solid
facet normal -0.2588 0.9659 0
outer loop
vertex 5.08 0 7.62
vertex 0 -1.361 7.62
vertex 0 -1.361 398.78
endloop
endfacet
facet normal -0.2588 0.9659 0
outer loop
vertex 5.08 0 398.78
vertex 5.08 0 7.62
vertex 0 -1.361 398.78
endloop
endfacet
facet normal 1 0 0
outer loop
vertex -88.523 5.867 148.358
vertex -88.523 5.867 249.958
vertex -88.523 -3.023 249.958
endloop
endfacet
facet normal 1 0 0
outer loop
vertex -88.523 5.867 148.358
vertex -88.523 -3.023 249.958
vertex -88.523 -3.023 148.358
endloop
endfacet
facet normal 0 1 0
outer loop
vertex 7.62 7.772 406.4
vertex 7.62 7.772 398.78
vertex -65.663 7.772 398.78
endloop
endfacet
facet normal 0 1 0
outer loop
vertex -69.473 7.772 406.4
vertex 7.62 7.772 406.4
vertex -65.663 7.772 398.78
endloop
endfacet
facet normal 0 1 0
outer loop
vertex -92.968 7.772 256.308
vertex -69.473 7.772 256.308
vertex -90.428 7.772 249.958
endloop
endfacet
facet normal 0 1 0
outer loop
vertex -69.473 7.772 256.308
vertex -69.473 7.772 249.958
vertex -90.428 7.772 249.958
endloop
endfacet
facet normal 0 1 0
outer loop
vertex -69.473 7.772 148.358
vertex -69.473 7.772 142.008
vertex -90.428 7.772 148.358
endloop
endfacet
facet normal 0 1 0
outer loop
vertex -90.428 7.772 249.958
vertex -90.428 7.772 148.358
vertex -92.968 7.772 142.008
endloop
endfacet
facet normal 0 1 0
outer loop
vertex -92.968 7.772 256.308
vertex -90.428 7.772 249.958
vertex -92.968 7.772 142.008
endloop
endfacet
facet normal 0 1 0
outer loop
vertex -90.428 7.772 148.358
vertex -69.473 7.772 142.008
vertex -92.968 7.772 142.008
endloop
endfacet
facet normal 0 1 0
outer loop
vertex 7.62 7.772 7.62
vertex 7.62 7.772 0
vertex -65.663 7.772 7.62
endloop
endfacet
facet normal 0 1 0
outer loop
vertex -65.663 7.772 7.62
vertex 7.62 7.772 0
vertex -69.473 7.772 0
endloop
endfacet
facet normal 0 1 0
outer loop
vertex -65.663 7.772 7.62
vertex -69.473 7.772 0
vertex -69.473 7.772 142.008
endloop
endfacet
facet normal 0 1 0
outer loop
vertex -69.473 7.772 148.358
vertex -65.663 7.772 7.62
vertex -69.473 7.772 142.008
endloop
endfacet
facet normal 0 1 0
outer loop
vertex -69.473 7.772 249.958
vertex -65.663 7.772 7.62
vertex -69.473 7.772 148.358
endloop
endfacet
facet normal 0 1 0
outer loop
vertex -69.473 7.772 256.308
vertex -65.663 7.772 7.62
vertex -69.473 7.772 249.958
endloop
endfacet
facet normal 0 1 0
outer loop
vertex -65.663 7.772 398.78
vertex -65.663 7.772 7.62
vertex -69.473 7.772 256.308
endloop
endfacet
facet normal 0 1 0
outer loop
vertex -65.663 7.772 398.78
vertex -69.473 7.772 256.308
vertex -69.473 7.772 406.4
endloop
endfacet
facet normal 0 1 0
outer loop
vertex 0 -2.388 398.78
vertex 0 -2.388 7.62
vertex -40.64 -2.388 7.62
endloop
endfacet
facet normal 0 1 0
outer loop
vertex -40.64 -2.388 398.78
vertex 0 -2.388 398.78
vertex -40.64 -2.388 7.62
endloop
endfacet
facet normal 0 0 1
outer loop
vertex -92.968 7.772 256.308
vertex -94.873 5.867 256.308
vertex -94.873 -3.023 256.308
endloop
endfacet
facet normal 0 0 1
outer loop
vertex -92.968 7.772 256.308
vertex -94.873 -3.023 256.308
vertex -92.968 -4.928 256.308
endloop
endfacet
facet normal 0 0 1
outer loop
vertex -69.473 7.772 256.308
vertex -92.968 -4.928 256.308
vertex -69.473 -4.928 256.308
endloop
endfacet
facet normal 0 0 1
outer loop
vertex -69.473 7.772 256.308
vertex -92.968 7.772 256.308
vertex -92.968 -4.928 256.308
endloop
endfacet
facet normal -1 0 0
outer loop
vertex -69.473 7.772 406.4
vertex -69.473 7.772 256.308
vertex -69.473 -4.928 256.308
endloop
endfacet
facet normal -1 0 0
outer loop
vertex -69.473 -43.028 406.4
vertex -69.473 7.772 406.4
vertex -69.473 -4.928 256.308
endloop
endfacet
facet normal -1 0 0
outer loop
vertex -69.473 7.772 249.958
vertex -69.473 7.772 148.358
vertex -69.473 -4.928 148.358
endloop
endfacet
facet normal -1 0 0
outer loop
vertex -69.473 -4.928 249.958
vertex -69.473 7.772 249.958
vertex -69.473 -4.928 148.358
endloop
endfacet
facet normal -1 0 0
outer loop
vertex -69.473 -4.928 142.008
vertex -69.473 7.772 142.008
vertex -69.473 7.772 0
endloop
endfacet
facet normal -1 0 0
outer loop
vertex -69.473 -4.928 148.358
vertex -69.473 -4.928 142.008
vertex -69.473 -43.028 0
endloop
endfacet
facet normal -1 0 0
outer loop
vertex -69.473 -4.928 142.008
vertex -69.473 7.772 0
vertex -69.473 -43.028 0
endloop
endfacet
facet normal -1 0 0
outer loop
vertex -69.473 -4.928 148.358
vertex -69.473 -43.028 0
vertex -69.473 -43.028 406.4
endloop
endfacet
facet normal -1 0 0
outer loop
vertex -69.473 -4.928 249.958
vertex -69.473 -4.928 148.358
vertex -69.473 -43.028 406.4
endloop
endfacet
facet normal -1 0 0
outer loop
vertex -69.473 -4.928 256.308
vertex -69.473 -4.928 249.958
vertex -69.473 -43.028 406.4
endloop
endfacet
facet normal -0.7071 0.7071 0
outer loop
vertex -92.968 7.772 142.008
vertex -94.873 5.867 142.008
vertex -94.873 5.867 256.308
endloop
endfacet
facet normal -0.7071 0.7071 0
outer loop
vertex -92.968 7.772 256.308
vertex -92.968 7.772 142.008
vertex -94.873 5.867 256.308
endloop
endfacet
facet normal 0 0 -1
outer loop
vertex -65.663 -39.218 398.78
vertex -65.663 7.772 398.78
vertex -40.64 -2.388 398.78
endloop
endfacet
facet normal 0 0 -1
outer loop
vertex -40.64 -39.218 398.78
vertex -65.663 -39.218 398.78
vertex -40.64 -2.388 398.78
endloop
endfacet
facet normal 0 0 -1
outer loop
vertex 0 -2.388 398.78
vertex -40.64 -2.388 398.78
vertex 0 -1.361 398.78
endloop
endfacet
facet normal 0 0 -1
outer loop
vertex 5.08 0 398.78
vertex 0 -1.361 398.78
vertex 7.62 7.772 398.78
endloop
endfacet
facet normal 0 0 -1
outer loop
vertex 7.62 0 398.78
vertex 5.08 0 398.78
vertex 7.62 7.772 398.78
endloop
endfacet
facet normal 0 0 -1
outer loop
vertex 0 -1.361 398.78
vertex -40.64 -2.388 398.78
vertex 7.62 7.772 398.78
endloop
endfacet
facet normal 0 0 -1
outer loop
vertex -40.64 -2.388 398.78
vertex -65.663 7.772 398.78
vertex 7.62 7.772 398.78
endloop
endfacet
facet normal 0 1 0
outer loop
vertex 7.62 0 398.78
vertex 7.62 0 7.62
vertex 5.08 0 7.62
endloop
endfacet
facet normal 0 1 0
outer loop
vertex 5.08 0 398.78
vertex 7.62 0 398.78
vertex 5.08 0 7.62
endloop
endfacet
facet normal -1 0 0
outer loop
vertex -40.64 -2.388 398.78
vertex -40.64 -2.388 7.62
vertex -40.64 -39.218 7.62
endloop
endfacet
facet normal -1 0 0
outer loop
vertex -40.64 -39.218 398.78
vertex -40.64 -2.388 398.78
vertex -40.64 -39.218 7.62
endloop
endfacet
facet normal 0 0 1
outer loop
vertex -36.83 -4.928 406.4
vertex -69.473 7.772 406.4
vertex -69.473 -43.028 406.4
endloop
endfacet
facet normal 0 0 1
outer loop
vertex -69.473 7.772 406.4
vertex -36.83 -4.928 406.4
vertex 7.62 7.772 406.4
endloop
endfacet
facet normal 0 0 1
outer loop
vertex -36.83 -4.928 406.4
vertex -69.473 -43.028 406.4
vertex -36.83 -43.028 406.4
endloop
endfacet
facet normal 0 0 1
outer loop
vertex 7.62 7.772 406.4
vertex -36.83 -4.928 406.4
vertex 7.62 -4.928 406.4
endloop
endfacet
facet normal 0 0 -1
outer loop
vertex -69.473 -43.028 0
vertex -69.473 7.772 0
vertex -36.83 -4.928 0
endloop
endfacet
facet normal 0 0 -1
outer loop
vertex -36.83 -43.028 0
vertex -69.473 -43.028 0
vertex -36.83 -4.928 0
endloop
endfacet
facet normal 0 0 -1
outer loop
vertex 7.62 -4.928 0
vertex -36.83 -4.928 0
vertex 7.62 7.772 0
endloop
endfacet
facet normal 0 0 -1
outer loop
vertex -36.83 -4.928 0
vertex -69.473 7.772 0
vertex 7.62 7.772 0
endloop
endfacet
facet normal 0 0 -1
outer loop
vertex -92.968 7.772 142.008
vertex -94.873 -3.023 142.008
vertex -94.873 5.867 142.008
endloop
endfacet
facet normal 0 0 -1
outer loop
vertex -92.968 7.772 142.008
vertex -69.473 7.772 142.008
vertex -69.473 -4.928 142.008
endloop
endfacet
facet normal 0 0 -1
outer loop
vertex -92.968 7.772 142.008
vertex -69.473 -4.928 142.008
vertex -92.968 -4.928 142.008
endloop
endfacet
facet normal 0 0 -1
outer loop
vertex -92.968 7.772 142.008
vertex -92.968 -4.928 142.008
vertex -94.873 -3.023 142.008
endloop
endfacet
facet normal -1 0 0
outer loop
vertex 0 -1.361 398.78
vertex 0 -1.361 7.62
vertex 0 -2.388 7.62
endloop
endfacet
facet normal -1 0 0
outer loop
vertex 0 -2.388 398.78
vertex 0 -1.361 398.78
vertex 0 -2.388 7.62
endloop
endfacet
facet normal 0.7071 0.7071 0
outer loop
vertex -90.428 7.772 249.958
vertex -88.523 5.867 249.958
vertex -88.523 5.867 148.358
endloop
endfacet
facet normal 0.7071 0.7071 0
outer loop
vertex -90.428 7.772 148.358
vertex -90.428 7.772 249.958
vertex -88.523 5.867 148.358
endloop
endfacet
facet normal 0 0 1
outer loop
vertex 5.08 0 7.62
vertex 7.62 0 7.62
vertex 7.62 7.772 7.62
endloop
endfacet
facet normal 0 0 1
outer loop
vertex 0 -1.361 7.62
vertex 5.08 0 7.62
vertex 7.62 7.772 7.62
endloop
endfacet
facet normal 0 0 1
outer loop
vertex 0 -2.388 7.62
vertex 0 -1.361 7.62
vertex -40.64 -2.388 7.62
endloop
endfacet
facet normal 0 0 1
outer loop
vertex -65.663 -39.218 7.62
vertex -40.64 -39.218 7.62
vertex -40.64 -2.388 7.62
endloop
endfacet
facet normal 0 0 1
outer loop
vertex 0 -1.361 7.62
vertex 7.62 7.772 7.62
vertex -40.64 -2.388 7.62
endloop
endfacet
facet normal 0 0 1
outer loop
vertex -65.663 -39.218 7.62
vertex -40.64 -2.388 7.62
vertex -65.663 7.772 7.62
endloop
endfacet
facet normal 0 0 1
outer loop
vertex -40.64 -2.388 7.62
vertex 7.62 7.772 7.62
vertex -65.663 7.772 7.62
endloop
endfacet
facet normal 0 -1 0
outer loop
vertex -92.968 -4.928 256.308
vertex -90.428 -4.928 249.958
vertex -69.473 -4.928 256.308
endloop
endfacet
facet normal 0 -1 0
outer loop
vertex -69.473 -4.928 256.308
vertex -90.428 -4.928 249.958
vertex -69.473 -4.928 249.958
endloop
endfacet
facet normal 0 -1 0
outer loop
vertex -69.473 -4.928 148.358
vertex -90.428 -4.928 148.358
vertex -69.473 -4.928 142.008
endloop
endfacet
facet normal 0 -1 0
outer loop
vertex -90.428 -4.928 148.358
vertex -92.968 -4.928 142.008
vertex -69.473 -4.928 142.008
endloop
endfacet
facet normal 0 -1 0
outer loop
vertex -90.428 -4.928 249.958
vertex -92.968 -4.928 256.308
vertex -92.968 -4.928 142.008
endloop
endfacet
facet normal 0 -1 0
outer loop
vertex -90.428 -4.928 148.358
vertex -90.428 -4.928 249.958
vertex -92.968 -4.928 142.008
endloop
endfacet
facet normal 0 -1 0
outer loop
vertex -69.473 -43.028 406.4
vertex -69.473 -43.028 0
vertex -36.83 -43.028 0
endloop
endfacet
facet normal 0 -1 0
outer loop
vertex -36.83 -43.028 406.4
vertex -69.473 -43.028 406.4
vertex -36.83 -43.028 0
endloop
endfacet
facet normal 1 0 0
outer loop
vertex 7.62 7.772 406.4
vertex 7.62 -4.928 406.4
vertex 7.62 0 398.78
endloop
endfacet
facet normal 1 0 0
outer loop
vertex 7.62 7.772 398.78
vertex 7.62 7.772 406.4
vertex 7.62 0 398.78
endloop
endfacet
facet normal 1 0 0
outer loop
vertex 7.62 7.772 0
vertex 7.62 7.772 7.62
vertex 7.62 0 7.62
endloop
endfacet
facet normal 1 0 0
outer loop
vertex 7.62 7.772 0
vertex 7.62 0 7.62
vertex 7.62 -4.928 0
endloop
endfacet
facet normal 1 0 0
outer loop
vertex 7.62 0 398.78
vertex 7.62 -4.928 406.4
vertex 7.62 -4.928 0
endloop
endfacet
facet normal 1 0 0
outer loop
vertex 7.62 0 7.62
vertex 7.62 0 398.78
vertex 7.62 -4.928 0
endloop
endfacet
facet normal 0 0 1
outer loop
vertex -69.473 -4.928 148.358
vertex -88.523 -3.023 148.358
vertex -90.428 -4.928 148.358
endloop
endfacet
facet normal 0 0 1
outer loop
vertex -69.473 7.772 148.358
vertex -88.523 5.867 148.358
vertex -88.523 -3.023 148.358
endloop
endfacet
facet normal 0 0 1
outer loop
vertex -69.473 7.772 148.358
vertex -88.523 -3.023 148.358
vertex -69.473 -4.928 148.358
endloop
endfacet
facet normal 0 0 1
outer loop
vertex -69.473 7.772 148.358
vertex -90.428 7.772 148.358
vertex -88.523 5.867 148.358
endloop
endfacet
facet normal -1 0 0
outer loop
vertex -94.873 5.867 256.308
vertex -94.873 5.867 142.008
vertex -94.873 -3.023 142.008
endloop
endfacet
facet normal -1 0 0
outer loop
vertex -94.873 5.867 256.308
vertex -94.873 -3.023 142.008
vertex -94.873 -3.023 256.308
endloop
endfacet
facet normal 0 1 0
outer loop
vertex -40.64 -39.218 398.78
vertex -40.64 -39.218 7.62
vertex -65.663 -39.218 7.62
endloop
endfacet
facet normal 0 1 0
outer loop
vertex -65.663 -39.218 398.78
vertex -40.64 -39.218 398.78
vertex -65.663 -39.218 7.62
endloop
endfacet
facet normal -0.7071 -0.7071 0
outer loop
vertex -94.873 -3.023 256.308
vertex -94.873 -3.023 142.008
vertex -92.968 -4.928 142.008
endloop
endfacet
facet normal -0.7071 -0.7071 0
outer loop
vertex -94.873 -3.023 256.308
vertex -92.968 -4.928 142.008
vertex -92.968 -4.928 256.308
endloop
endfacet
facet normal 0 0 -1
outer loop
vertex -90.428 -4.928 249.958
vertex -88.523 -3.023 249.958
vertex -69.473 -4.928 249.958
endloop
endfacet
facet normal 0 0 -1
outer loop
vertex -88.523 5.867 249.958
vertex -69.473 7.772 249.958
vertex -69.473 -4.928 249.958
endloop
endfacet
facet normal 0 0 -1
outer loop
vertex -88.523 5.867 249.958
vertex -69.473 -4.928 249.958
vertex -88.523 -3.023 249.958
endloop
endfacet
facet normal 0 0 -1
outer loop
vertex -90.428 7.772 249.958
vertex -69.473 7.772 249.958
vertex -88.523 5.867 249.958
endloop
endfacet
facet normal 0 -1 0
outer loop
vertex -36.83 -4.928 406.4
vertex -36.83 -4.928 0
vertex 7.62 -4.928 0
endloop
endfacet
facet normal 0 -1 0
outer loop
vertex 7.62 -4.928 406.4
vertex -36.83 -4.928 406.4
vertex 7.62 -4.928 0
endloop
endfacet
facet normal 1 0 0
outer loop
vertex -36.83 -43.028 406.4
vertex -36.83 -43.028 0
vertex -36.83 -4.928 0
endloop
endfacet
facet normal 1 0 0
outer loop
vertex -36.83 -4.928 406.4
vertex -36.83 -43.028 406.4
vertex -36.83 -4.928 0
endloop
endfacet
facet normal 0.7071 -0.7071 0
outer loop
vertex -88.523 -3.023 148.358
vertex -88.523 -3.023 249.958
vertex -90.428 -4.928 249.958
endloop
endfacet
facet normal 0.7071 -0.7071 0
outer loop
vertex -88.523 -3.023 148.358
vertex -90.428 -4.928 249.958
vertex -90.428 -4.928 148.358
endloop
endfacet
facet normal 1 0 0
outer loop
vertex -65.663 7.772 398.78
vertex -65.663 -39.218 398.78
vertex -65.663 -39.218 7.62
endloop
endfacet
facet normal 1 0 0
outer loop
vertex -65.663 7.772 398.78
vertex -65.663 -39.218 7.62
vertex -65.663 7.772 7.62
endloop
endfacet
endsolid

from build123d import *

# Parameters (mm, degrees)
BOSS_EXTRUDE1_DEPTH = 406.4
SKETCH4_W           = 73.282534648
SKETCH4_H           = 7.62
BOSS_EXTRUDE4_DEPTH = 10.16
BOSS_EXTRUDE5_START = -7.62
SKETCH7_W           = 25.022534648
SKETCH7_H           = 36.83
BOSS_EXTRUDE5_DEPTH = 7.62
BOSS_EXTRUDE6_START = -7.62
SKETCH11_W          = 25.022534648
SKETCH11_H          = 36.83
BOSS_EXTRUDE6_DEPTH = 7.62
BOSS_EXTRUDE7_DEPTH = 12.7
CHAMFER3_SIZE       = 1.905
CHAMFER4_SIZE       = 5.08
CHAMFER4_SIZE2      = 1.361181898


with BuildPart() as part:
    # Sketch1 → Boss-Extrude1 (new body)
    with BuildSketch(Plane.XY):
        Polygon((-36.83, -4.9276), (7.62, -4.9276), (7.62, 0), (0, 0), (0, -2.3876), (-29.21, -2.3876), (-40.64, -2.3876), (-40.64, -39.2176), (-65.662534648, -39.2176), (-65.662534648, 7.7724), (-69.472534648, 7.7724), (-69.472534648, -43.0276), (-36.83, -43.0276), align=None)
    extrude(amount=BOSS_EXTRUDE1_DEPTH)

    # Sketch4 → Boss-Extrude4 (add)
    with BuildSketch(Plane(origin=(0, -2.3876, 0), x_dir=(1, 0, 0), z_dir=(0, 1, 0))):
        with Locations((-29.021267324, -402.59)):
            Rectangle(SKETCH4_W, SKETCH4_H)
        with Locations((-29.021267324, -3.81)):
            Rectangle(SKETCH4_W, SKETCH4_H)
    extrude(amount=BOSS_EXTRUDE4_DEPTH)

    # Sketch7 → Boss-Extrude5 (add)
    with BuildSketch(Plane.XY.offset(406.4).offset(BOSS_EXTRUDE5_START)):
        with Locations((-53.151267324, -20.8026)):
            Rectangle(SKETCH7_W, SKETCH7_H)
    extrude(amount=BOSS_EXTRUDE5_DEPTH)

    # Sketch11 → Boss-Extrude6 (add)
    with BuildSketch(Plane(origin=(0, 0, 0), x_dir=(-1, 0, 0), z_dir=(0, 0, -1)).offset(BOSS_EXTRUDE6_START)):
        with Locations((53.151267324, -20.8026)):
            Rectangle(SKETCH11_W, SKETCH11_H)
    extrude(amount=BOSS_EXTRUDE6_DEPTH)

    # Sketch15 → Boss-Extrude7 (add)
    with BuildSketch(Plane(origin=(0, 7.7724, 0), x_dir=(1, 0, 0), z_dir=(0, 1, 0))):
        Polygon((-69.472534648, -256.308132937), (-69.472534648, -249.958132937), (-88.522534648, -249.958132937), (-88.522534648, -148.358132937), (-69.472534648, -148.358132937), (-69.472534648, -142.008132937), (-94.872534648, -142.008132937), (-94.872534648, -256.308132937), align=None)
    extrude(amount=-BOSS_EXTRUDE7_DEPTH)

    # Chamfer3
    chamfer3_edges = [part.edges().sort_by_distance(p)[0] for p in [
        (-88.522534648, -4.9276, 199.158132937),
        (-94.872534648, -4.9276, 199.158132937),
        (-94.872534648, 7.7724, 199.158132937),
        (-88.522534648, 7.7724, 199.158132937),
    ]]
    chamfer(chamfer3_edges, length=CHAMFER3_SIZE)

    # Chamfer4
    chamfer4_edges = [part.edges().sort_by_distance(p)[0] for p in [
        (0, 0, 203.2),
    ]]
    chamfer4_side = [part.faces().sort_by_distance(p)[0] for p in [
        (3.81, 0, 203.2),
    ]]
    chamfer(chamfer4_edges, length=CHAMFER4_SIZE, length2=CHAMFER4_SIZE2, reference=chamfer4_side[0])


solid = part.part
